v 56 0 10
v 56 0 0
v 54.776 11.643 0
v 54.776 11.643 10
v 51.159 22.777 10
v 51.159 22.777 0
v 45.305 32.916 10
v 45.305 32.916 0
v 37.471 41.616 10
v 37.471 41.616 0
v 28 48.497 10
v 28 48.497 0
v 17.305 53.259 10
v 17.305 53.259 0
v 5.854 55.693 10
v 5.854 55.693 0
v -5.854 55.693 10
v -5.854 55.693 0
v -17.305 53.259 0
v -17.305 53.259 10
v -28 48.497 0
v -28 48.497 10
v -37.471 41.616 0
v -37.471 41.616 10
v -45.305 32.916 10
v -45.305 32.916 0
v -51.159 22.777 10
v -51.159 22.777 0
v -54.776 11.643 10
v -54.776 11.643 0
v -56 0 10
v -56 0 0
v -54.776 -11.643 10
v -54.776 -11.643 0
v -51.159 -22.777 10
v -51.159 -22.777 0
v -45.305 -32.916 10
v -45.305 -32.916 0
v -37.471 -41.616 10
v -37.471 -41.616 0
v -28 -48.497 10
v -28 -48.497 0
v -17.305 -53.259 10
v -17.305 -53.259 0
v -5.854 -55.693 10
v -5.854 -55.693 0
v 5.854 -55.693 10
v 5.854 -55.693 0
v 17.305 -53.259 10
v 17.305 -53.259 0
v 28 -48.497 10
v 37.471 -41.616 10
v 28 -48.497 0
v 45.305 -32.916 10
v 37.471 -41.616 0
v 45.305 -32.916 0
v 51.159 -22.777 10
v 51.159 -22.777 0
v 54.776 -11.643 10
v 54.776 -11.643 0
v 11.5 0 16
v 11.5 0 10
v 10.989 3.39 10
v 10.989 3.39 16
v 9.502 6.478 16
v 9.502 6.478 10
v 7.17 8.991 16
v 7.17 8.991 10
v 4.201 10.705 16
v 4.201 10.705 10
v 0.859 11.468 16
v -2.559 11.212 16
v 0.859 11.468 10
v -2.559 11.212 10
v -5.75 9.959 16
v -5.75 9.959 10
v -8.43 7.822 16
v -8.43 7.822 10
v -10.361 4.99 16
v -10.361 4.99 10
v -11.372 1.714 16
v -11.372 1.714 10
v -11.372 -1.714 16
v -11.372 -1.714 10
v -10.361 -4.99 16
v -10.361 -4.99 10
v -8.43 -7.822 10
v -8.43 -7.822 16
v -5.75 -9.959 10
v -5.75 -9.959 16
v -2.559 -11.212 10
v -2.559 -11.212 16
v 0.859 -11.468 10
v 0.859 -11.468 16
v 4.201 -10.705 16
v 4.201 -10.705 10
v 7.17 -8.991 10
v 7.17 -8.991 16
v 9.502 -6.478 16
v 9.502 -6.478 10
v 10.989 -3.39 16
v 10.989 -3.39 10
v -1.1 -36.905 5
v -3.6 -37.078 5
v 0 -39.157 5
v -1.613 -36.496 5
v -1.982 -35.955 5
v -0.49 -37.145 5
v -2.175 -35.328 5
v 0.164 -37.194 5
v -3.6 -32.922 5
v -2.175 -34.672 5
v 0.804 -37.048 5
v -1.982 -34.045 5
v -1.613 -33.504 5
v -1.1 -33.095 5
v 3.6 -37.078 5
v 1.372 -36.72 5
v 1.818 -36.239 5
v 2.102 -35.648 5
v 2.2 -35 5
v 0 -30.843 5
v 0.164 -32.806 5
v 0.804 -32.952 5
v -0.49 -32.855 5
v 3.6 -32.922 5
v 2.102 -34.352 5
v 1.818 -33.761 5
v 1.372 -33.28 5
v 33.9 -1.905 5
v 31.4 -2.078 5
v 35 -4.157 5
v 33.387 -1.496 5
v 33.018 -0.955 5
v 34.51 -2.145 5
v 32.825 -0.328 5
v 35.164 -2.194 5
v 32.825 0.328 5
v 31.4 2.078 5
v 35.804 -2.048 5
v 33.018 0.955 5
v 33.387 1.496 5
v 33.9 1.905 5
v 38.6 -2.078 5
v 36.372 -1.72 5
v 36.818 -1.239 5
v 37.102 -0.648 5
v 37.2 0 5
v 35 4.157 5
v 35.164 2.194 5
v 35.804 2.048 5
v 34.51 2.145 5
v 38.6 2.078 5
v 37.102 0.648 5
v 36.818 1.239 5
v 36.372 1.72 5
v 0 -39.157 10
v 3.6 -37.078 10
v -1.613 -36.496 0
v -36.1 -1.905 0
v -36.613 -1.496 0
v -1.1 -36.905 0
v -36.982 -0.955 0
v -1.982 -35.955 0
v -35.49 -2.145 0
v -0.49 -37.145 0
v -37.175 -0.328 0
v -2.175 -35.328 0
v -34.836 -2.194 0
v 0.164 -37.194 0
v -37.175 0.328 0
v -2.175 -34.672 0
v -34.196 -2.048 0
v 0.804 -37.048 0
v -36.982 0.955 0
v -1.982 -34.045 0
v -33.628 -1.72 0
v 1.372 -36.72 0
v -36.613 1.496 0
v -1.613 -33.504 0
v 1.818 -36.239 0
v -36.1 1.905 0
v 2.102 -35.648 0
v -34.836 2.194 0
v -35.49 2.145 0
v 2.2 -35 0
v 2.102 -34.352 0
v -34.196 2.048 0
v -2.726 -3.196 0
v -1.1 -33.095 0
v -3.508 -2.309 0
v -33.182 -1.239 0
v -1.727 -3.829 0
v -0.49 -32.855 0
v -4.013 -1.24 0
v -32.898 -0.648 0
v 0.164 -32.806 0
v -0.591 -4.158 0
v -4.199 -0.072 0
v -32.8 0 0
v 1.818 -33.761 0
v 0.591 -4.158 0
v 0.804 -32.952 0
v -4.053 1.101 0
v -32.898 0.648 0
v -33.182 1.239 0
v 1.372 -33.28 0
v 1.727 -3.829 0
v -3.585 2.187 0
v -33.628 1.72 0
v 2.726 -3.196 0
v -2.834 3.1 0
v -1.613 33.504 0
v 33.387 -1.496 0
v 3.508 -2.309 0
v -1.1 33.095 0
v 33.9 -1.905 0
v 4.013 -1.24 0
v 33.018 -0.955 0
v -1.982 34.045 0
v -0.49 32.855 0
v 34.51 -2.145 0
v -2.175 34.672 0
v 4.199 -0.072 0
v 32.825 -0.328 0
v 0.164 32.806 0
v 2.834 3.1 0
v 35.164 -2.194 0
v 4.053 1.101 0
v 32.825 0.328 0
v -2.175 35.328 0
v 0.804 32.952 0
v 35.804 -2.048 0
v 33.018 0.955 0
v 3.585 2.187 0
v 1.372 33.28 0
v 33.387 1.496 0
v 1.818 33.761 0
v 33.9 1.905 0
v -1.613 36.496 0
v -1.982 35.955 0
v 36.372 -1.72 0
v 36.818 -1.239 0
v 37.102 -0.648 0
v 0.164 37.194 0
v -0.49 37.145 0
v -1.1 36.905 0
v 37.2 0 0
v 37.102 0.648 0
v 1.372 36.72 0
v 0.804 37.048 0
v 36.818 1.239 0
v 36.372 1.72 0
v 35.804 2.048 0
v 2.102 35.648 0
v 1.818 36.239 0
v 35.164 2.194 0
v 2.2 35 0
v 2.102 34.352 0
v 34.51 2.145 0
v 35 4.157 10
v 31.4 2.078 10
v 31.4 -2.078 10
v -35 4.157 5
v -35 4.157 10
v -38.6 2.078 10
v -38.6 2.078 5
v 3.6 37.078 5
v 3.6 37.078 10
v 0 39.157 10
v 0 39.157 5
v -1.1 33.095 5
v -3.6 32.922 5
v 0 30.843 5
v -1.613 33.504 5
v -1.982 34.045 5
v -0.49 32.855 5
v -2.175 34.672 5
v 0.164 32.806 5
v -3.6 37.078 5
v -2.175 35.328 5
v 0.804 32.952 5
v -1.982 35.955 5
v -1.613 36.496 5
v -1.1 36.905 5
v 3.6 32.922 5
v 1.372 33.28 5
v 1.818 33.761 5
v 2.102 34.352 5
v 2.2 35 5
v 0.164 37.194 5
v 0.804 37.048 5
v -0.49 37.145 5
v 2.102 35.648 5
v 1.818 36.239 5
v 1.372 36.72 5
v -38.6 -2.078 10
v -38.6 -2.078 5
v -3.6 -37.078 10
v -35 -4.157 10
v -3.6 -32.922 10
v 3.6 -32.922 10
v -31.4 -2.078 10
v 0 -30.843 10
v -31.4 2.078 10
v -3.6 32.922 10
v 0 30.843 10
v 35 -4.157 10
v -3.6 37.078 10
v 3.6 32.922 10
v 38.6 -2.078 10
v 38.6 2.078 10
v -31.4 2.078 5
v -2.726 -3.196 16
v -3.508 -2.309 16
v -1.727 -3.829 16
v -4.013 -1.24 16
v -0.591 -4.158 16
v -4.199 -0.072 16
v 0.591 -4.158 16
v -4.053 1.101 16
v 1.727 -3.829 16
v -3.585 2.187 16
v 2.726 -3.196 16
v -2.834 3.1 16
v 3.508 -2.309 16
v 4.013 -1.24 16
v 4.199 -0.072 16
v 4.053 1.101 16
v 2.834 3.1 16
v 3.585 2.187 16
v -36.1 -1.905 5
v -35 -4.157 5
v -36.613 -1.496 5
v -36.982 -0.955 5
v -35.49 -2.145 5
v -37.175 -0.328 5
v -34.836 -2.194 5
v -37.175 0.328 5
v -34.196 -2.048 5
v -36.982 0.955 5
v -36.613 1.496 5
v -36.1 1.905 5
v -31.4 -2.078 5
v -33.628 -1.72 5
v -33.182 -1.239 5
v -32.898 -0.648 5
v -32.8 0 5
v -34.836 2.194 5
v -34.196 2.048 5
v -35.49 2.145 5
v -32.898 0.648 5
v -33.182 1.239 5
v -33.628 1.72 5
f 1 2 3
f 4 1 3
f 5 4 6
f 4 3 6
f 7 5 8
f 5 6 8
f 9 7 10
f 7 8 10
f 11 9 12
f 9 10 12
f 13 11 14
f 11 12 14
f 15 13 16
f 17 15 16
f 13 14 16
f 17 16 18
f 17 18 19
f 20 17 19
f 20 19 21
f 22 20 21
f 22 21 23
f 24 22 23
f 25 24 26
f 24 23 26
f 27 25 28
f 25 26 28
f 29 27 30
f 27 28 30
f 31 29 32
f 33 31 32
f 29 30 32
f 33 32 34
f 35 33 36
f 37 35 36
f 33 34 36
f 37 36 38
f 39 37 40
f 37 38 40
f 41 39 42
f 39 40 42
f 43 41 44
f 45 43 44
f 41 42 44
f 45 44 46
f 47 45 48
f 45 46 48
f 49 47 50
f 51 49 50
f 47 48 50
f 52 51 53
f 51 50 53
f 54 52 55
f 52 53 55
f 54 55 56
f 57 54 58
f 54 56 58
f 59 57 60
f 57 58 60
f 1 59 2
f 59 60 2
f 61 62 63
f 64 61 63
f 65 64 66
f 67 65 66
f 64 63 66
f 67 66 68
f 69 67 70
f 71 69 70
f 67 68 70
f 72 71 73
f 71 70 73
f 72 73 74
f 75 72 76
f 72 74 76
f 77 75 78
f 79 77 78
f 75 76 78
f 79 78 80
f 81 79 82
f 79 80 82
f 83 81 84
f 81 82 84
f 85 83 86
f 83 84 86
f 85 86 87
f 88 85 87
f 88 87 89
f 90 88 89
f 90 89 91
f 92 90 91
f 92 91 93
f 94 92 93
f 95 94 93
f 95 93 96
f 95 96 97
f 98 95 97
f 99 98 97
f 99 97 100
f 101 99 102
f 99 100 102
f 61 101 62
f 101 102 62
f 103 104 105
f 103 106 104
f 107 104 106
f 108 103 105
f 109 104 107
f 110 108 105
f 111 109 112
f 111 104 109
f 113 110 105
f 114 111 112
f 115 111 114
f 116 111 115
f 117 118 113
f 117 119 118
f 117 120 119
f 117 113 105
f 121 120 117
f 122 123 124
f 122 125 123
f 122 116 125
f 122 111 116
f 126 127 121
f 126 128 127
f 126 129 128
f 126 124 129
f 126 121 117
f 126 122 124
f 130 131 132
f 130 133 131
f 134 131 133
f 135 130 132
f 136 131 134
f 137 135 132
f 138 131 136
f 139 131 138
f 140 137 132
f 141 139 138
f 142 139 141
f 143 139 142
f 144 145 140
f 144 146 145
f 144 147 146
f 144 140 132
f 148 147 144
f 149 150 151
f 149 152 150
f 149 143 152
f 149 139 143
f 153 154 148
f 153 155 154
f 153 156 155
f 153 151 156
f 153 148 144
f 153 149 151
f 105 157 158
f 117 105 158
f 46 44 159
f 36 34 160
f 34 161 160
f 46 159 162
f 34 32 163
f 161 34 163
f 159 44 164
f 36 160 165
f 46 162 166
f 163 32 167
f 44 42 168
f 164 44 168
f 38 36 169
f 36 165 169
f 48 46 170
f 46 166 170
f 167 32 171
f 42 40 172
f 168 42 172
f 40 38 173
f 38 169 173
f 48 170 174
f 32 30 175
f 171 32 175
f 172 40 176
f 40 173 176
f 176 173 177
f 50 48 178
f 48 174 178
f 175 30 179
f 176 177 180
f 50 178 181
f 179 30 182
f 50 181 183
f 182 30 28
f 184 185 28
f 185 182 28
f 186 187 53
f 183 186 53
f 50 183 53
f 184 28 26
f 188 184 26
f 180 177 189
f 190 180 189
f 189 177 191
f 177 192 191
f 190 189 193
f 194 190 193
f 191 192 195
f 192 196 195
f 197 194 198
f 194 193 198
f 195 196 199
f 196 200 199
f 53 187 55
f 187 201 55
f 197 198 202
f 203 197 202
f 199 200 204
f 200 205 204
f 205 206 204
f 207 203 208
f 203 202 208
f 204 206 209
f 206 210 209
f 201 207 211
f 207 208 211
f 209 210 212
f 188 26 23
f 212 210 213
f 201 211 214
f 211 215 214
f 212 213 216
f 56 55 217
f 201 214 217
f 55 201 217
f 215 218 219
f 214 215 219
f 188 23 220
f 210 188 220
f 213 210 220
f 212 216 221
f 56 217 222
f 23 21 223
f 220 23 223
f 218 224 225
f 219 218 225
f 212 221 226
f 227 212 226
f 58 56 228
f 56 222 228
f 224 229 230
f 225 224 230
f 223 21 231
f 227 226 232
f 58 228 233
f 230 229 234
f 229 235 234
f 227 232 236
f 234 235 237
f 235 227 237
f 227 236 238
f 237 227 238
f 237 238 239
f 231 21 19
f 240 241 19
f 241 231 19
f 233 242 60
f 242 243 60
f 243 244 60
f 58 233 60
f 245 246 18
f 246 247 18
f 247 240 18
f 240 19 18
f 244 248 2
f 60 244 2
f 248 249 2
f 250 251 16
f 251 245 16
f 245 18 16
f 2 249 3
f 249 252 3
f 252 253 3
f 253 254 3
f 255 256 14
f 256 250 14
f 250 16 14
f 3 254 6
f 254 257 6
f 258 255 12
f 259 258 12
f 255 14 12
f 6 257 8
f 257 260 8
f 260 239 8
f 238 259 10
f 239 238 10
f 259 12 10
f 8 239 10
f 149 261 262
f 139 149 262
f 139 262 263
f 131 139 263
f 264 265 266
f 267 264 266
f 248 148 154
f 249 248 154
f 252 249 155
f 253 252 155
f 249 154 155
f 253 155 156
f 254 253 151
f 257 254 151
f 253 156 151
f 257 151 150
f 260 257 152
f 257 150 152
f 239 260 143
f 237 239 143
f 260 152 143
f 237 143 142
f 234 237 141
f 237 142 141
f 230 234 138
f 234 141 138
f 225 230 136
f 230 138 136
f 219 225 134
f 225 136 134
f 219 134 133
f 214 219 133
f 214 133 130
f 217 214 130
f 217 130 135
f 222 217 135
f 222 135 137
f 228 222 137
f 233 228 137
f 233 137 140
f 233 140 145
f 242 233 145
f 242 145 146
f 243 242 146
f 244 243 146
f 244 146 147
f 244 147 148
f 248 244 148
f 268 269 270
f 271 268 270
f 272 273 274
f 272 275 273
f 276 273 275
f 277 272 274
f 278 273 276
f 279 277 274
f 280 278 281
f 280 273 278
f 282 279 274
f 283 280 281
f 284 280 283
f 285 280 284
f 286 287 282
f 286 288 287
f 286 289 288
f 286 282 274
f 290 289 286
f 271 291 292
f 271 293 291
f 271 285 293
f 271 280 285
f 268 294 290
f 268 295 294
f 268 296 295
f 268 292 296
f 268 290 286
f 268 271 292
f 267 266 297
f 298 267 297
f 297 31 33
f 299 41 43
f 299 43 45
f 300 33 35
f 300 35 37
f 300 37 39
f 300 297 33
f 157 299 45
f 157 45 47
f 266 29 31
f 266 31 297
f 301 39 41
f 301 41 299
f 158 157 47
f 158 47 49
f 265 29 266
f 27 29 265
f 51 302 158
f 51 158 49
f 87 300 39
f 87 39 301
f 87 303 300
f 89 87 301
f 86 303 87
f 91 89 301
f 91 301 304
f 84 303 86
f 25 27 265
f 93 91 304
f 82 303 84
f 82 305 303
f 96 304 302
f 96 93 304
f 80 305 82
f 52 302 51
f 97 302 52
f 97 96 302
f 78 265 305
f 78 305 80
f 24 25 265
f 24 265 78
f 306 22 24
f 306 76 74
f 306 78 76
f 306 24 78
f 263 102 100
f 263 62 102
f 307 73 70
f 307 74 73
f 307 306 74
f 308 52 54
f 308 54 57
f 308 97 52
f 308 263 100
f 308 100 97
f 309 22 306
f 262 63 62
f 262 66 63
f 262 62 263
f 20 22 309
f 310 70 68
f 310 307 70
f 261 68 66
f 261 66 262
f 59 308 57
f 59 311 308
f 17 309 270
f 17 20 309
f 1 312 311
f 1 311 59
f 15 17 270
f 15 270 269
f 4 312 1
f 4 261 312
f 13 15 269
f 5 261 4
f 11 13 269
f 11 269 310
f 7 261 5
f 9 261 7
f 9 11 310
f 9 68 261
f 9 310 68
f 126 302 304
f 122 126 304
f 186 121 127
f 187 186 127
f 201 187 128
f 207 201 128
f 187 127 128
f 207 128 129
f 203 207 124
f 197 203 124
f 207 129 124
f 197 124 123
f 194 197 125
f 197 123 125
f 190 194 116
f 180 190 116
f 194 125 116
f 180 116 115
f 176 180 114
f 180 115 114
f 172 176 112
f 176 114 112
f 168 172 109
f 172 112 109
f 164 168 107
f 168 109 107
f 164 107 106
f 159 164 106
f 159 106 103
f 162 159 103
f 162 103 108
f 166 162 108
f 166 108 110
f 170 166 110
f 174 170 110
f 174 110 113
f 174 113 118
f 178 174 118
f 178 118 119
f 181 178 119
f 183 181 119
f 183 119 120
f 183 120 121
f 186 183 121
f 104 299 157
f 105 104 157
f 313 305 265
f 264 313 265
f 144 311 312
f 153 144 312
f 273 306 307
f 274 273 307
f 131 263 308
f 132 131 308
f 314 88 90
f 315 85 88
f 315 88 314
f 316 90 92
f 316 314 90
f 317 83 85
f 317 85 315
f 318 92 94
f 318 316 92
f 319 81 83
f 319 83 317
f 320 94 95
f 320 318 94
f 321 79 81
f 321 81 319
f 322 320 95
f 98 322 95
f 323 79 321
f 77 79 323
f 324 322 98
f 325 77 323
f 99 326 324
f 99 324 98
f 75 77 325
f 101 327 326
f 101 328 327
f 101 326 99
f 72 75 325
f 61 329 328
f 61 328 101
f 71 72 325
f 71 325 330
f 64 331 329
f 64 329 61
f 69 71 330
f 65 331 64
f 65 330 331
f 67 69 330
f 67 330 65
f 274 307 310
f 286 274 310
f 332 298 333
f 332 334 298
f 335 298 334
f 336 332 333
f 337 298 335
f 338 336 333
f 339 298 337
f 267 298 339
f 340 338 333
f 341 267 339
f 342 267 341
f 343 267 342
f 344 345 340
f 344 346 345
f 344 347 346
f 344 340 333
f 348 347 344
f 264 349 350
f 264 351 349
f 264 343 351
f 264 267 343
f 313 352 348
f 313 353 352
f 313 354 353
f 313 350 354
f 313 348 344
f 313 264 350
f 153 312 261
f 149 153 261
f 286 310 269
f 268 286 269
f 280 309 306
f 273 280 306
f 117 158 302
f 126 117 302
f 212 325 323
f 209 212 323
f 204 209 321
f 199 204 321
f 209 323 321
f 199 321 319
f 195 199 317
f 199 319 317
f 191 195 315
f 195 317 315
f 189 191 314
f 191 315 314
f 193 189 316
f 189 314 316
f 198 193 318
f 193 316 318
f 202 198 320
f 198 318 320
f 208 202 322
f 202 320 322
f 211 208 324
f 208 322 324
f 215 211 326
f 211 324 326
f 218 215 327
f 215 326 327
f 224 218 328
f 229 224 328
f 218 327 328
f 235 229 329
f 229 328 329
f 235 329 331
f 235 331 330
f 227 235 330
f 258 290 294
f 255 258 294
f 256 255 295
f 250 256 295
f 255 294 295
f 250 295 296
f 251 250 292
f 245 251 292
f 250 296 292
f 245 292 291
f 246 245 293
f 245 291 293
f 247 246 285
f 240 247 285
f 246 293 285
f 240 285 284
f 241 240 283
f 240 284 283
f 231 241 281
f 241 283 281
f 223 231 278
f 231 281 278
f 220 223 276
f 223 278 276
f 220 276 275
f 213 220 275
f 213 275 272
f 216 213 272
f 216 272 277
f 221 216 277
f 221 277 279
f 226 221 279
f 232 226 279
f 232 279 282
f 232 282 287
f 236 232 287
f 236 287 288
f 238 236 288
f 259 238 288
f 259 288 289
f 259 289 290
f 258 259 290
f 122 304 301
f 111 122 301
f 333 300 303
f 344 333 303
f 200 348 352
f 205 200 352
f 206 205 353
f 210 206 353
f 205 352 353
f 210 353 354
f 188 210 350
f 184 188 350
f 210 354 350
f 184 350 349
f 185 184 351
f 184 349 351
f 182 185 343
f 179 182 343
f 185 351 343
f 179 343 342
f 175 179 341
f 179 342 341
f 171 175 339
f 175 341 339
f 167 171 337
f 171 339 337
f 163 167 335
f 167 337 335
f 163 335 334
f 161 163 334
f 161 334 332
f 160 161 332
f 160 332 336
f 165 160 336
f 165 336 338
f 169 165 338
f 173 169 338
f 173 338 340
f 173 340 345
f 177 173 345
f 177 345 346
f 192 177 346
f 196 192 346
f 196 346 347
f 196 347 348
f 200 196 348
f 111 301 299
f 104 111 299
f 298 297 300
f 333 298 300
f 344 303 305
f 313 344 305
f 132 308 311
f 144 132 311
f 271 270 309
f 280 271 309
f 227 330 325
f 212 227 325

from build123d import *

# Parameters (mm, degrees)
F0_R     = 56
F1_DEPTH = 10
F2_R     = 11.5
F3_DEPTH = 6
F5_DEPTH = 16
F6_R     = 2.2
F7_DEPTH = 10
F9_DEPTH = 5


with BuildPart() as f1:
    # F0 (on Top) → F1 (new body)
    with BuildSketch(Plane.XY):
        Circle(F0_R)
    extrude(amount=F1_DEPTH)

    # F2 (on face) → F3 (join)
    with BuildSketch(Plane.XY.offset(10)):
        Circle(F2_R)
    extrude(amount=F3_DEPTH)

    # F4 (on face) → F5 (cut)
    with BuildSketch(Plane.XY.offset(16)):
        with BuildLine():
            Line((2.833725, 3.1), (-2.833725, 3.1))
            ThreePointArc((-2.833725, 3.1), (0, -4.2), (2.833725, 3.1))
        make_face()
    extrude(amount=-F5_DEPTH, mode=Mode.SUBTRACT)

    # F6 (on face) → F7 (cut)
    with BuildSketch(Plane.XY.offset(10)):
        with Locations((0, 35)):
            Circle(F6_R)
        with Locations((35, 0)):
            Circle(F6_R)
        with Locations((-35, 0)):
            Circle(F6_R)
        with Locations((0, -35)):
            Circle(F6_R)
    extrude(amount=-F7_DEPTH, mode=Mode.SUBTRACT)

    # F8 (on face) → F9 (cut)
    with BuildSketch(Plane.XY.offset(10)):
        Polygon((3.6, 32.921539), (3.6, 37.078461), (0, 39.156922), (-3.6, 37.078461), (-3.6, 32.921539), (0, 30.843078), align=None)
        Polygon((38.6, -2.078461), (38.6, 2.078461), (35, 4.156922), (31.4, 2.078461), (31.4, -2.078461), (35, -4.156922), align=None)
        Polygon((3.6, -37.078461), (3.6, -32.921539), (0, -30.843078), (-3.6, -32.921539), (-3.6, -37.078461), (0, -39.156922), align=None)
        Polygon((-31.4, -2.078461), (-31.4, 2.078461), (-35, 4.156922), (-38.6, 2.078461), (-38.6, -2.078461), (-35, -4.156922), align=None)
    extrude(amount=-F9_DEPTH, mode=Mode.SUBTRACT)


solid = f1.part
